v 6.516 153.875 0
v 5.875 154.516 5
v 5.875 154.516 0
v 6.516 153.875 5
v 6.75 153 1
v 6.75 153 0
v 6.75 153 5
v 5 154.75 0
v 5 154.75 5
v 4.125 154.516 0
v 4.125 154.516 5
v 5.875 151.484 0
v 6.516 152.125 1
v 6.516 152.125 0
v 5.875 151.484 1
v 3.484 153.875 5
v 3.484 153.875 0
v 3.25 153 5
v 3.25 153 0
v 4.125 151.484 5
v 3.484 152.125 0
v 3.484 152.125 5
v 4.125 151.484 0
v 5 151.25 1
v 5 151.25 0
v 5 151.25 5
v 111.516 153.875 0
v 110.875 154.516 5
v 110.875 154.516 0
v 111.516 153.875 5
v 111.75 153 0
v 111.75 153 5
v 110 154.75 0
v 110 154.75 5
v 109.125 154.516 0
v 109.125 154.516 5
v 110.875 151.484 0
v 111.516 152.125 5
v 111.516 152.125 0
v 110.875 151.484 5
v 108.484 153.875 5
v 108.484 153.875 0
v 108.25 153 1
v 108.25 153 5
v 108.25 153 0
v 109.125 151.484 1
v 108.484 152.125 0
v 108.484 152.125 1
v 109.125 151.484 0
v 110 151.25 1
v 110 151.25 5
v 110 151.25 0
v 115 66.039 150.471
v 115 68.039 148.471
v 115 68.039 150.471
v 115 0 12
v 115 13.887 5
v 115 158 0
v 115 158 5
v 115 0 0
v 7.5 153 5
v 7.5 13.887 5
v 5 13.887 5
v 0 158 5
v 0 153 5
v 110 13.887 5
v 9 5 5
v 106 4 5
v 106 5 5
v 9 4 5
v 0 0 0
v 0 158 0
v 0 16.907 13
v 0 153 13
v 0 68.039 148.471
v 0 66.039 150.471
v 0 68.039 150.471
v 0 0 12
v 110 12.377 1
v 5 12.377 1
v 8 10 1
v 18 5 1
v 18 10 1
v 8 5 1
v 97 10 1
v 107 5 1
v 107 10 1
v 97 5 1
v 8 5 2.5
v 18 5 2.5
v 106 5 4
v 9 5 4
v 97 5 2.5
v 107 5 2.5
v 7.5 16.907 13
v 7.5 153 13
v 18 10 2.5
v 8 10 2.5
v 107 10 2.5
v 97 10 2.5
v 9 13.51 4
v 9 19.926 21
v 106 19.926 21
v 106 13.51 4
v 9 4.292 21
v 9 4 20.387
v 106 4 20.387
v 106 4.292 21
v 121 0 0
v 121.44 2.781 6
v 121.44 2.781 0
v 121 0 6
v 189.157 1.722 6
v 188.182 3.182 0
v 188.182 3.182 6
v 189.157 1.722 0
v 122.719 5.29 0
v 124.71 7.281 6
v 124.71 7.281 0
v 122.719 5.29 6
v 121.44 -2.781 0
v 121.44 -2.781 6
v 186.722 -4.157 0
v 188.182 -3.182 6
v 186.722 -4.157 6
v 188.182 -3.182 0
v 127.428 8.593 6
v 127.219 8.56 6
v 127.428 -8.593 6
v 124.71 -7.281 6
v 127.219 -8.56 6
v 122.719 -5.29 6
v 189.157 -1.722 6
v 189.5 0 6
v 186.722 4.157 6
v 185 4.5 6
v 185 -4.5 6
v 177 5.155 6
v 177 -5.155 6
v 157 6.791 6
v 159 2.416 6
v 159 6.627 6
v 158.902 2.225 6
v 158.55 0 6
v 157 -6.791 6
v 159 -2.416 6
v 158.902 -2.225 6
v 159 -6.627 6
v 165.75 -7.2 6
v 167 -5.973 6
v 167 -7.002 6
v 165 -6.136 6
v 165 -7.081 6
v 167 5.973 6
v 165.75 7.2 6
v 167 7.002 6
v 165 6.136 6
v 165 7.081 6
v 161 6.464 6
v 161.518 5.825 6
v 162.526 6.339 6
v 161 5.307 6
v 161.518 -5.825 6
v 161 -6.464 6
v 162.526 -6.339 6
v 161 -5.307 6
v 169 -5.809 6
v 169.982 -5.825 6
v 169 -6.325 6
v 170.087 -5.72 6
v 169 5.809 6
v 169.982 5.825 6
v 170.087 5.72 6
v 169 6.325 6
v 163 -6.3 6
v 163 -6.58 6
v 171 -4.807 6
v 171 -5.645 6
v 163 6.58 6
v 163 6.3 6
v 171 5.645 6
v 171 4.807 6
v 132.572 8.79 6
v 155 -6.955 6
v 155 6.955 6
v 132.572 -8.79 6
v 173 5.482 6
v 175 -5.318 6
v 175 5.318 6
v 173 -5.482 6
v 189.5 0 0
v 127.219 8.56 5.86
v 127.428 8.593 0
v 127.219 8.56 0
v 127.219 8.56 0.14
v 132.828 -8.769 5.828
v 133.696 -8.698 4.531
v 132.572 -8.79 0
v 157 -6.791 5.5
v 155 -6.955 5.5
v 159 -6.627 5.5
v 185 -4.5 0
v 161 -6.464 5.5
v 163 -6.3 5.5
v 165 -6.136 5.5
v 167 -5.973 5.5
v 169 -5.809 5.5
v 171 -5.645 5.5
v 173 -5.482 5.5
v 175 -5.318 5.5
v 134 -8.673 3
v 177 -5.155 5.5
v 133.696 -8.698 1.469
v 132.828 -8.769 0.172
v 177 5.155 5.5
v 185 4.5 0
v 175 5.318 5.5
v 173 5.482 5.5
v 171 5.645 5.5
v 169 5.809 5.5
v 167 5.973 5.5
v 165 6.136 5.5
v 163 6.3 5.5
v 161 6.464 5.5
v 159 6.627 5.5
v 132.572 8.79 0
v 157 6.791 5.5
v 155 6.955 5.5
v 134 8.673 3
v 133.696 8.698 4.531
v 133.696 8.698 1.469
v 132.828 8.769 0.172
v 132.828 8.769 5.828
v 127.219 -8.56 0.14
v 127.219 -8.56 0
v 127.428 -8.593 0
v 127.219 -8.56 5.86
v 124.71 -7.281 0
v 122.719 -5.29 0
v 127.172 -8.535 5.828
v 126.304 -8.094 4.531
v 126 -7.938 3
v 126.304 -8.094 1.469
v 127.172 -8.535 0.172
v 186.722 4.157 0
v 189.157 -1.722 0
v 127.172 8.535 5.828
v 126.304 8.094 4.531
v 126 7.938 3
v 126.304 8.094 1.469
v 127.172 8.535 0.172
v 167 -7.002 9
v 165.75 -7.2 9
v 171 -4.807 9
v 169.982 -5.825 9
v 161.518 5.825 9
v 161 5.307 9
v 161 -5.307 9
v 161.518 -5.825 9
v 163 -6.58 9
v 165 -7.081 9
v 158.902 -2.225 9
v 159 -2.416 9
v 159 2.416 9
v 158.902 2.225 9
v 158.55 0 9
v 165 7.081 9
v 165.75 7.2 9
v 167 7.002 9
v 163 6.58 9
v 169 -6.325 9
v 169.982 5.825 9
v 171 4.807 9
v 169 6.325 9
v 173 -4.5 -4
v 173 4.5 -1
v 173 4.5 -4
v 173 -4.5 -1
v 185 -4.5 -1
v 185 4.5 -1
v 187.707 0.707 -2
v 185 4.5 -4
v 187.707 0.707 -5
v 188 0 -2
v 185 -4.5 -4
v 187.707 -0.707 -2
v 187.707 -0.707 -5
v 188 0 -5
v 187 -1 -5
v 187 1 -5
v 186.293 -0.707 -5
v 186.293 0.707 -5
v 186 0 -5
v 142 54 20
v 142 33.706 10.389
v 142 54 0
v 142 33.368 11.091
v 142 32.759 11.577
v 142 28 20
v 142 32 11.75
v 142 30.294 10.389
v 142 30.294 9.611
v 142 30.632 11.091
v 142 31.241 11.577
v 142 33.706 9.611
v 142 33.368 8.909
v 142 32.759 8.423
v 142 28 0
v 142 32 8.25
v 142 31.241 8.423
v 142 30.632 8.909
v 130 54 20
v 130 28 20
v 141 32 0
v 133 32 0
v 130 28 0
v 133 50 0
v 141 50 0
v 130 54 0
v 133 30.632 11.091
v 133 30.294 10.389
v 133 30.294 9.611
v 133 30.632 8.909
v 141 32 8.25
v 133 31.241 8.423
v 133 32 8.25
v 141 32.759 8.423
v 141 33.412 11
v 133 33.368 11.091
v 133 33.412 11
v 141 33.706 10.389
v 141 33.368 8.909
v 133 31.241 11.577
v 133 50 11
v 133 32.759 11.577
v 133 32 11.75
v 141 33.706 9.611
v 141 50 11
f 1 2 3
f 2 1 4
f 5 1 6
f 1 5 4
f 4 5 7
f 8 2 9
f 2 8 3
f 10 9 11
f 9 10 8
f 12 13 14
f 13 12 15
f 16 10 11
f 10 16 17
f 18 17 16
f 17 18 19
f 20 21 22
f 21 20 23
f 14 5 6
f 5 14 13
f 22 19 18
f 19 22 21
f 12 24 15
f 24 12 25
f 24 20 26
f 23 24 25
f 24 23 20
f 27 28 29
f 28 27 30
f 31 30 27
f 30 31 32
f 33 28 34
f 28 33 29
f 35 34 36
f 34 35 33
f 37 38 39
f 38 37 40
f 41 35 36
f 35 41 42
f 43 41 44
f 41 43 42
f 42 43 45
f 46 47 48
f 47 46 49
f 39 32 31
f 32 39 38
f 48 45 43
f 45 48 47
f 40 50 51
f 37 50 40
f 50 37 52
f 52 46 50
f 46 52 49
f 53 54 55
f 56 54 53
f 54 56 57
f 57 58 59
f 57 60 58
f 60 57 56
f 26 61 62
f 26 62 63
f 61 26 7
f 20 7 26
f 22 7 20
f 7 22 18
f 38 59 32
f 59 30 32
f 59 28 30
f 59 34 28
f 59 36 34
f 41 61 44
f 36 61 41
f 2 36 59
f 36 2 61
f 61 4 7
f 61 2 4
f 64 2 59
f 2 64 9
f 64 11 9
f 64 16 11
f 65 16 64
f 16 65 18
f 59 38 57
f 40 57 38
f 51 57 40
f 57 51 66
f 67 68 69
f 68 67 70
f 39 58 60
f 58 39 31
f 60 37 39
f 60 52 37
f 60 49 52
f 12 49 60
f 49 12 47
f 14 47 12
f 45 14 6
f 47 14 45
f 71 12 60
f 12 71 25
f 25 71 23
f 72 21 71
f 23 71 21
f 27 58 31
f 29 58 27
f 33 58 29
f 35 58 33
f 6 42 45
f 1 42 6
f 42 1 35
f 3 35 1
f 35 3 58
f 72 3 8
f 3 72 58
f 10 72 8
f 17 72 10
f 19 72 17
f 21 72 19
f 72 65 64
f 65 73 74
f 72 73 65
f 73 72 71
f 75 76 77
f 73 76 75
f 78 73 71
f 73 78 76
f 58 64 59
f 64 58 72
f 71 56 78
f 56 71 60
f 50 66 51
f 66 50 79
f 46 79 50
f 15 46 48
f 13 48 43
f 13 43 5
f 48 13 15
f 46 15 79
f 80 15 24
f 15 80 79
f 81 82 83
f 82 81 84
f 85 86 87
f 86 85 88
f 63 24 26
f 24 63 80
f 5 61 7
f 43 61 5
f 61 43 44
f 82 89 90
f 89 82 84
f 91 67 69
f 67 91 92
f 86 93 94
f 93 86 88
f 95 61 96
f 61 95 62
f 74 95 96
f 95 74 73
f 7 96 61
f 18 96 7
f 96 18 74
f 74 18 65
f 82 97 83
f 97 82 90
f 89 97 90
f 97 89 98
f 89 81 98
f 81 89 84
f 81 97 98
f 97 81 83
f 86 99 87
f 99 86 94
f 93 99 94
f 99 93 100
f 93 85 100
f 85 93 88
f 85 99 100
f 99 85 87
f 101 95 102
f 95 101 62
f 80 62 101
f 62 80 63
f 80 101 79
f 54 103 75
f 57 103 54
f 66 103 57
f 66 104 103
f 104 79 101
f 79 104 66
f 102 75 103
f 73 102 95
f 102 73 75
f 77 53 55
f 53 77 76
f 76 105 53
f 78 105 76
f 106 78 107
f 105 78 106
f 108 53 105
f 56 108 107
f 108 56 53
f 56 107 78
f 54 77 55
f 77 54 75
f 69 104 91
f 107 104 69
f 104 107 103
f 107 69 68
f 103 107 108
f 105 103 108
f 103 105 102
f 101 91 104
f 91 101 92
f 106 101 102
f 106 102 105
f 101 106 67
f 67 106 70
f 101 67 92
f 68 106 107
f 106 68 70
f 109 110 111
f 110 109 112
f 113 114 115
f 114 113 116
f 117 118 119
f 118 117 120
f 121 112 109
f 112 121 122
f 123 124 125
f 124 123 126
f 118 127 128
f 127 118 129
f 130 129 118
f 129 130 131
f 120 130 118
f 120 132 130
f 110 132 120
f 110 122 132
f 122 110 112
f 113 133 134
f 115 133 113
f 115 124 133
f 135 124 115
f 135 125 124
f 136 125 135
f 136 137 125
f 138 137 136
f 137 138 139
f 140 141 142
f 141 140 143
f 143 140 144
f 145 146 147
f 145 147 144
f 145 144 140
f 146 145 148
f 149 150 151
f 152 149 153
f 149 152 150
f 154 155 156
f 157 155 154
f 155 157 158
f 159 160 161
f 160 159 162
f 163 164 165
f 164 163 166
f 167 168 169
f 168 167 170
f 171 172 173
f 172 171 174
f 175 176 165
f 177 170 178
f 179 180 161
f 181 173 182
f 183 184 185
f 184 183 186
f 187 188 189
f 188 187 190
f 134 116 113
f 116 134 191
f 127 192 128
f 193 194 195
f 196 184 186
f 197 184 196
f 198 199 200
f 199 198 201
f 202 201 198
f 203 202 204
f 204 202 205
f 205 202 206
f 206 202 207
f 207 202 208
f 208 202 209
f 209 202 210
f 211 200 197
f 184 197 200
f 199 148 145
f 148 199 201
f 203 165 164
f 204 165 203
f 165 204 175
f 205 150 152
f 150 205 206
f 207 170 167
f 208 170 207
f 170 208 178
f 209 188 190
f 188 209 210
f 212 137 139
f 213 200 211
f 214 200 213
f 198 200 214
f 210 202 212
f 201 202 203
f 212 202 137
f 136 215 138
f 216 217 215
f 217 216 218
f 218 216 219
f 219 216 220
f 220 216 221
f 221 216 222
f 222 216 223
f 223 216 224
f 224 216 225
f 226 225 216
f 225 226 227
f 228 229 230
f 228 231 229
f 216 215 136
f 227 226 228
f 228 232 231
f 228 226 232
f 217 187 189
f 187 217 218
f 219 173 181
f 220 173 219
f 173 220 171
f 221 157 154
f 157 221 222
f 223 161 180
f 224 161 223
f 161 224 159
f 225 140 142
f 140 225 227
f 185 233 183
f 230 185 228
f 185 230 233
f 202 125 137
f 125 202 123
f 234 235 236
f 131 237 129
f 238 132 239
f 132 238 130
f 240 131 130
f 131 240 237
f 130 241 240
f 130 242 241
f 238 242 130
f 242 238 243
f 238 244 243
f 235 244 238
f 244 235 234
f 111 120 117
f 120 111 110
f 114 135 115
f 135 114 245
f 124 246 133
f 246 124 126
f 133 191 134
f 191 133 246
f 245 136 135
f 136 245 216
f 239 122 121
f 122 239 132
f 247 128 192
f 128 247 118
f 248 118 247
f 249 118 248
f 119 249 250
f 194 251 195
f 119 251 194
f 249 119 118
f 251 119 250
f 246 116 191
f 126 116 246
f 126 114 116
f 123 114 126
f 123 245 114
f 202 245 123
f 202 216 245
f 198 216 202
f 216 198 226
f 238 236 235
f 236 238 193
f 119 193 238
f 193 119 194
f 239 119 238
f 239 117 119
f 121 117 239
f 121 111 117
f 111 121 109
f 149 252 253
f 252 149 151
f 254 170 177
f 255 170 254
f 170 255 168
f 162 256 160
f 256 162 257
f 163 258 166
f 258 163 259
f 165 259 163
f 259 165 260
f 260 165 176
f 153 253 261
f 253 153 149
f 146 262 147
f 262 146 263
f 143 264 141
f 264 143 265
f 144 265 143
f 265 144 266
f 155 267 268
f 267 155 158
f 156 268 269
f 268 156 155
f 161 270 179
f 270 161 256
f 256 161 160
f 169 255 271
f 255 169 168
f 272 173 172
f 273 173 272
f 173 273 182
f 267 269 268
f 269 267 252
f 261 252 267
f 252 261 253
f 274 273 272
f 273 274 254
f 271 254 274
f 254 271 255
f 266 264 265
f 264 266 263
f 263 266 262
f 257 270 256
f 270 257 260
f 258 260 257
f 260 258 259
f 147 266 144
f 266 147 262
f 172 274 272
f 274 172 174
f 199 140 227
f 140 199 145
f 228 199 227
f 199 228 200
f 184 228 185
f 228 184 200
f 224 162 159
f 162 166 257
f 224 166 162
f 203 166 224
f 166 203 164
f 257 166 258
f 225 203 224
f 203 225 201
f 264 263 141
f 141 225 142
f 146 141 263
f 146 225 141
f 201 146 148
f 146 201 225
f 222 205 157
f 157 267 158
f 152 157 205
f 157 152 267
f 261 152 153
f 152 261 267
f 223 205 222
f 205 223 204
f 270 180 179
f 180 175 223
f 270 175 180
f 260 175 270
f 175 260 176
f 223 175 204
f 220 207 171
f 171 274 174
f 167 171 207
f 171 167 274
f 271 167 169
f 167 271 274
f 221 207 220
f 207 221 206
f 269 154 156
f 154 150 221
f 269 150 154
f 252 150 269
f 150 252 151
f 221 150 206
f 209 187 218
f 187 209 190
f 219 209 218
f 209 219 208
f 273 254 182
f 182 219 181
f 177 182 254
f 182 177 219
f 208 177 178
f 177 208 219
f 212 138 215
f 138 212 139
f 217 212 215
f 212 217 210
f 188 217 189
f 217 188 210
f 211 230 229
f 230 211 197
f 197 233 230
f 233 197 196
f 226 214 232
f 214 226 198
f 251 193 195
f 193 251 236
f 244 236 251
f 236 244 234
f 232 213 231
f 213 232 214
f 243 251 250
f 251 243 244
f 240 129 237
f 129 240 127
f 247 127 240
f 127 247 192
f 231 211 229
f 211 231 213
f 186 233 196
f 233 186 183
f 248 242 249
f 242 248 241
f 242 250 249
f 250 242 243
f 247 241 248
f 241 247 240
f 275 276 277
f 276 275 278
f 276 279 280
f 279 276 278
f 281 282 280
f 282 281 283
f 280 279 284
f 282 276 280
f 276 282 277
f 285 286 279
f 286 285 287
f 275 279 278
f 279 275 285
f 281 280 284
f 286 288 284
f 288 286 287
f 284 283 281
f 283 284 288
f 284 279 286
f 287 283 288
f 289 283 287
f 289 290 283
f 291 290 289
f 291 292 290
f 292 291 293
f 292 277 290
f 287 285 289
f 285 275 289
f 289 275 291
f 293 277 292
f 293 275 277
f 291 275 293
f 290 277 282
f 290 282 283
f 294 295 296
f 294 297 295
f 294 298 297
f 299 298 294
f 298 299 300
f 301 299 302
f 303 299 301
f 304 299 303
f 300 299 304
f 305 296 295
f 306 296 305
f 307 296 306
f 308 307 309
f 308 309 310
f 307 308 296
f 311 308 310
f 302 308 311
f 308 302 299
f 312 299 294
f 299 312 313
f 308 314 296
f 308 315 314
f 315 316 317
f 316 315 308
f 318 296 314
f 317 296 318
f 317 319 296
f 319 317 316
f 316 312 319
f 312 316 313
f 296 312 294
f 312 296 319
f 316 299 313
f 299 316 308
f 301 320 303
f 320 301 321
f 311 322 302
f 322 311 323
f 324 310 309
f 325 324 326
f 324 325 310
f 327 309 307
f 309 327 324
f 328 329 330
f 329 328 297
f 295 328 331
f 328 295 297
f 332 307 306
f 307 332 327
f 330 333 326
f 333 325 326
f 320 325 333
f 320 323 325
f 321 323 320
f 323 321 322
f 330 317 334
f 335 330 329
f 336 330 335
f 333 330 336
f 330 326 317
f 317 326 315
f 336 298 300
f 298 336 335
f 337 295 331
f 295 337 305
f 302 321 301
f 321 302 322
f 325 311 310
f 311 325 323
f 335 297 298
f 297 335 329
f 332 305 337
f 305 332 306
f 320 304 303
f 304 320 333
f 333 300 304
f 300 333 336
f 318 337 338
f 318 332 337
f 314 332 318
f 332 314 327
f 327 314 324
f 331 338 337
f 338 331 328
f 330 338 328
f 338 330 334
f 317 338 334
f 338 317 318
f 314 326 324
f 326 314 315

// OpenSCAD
// Flip Book Stand + Page Turner Mechanism
// Spring-loaded thumb lever flips pages at consistent speed
// DUAL COLOR: frame (dark wood PLA) + lever + spring seat (accent)
// PLA — 0.2mm, 4 walls, 20% infill
// Hardware: 1x M3x20 bolt pivot, 1x guitar string spring

BOOK_W   = 105;  // Standard flip book width
BOOK_H   = 148;  // A6 / standard flip book height
BOOK_T   = 20;   // Book thickness (stack of pages)
FRAME_T  = 5.0;  // Frame wall thickness
BASE_H   = 12;
TILT     = 20;   // Book tilt angle (degrees)
LEVER_L  = 55;   // Thumb lever length
LEVER_W  = 18;
LEVER_T  = 6.0;
PIVOT_D  = 3.5;  // M3 pivot
SPRING_D = 8;    // Spring seat diameter
PAGE_SEP = 1.0;  // Page separator rib gap

module frame_back() {
    // Back plate that holds the book
    difference() {
        cube([BOOK_W + FRAME_T*2, BOOK_H + FRAME_T*2, FRAME_T]);
        // Book window (recessed)
        translate([FRAME_T, FRAME_T, 1])
            cube([BOOK_W, BOOK_H, FRAME_T]);
        // Corner screw holes
        for (x = [5, BOOK_W + FRAME_T*2 - 5],
             y = [5, BOOK_H + FRAME_T*2 - 5])
            translate([x, y, -1])
                cylinder(d = 3.5, h = FRAME_T + 2, $fn = 12);
    }
    // Spine clamp (holds left edge of book)
    translate([0, FRAME_T, FRAME_T])
        cube([FRAME_T * 1.5, BOOK_H, 8]);
}

module base_stand() {
    // Tilted wedge base
    difference() {
        hull() {
            cube([BOOK_W + FRAME_T*2, BASE_H, BASE_H]);
            translate([0, BASE_H + (BOOK_H + FRAME_T*2) * sin(TILT),
                       (BOOK_H + FRAME_T*2) * cos(TILT)])
                cube([BOOK_W + FRAME_T*2, 2, 2]);
        }
        // Weight reduction
        translate([FRAME_T + 4, 4, 4])
            cube([BOOK_W - 8, BASE_H + 20, BASE_H + 5]);
        // Anti-slip pad recesses (feet)
        for (x = [8, BOOK_W + FRAME_T*2 - 18])
            translate([x, 2, -0.5])
                cube([10, 8, 3]);
    }
}

module thumb_lever() {
    // Spring-loaded page flipper
    difference() {
        union() {
            // Lever arm
            hull() {
                cylinder(d = LEVER_W, h = LEVER_T, $fn = 20);
                translate([LEVER_L, 0, 0])
                    cylinder(d = LEVER_W * 0.5, h = LEVER_T, $fn = 16);
            }
            // Thumb groove pad
            translate([LEVER_L * 0.65, 0, LEVER_T])
                cylinder(d = LEVER_W * 0.8, h = 3, $fn = 20);
        }
        // Pivot hole
        cylinder(d = PIVOT_D, h = LEVER_T + 1, $fn = 14);
        // Spring tension slot
        translate([0, 0, LEVER_T/2])
            rotate([90, 0, 0])
                cylinder(d = SPRING_D, h = LEVER_W + 1, center = true, $fn = 16);
        // Thumb grip knurling
        for (i = [0:5])
            translate([LEVER_L * 0.6 + i * 4 - 8, -LEVER_W/2, LEVER_T - 0.5])
                cube([2, LEVER_W, 4]);
    }
    // Page separator fins (peels one page at a time)
    translate([LEVER_L - 12, -LEVER_W/4, 0])
        for (i = [0:2])
            translate([0, 0, -i * PAGE_SEP - 2])
                hull() {
                    cube([12, LEVER_W/2, 1]);
                    translate([14, LEVER_W/4, -1])
                        cylinder(d = 2, h = 1, $fn = 8);
                }
}

module pivot_bracket() {
    // Mounts lever to frame side
    difference() {
        cube([12, LEVER_W + 8, 20]);
        translate([3, 4, 10])
            rotate([0, 90, 0])
                cylinder(d = PIVOT_D, h = 10, $fn = 14);
        // Lever slot
        translate([3, 4, -1])
            cube([8, LEVER_W, 12]);
    }
}

// Color 1 (wood PLA): frame + base
frame_back();
base_stand();
// Color 2 (accent): lever + bracket
translate([BOOK_W + FRAME_T*2 + 15, 0, 0]) {
    thumb_lever();
    translate([0, LEVER_W + 10, 0]) pivot_bracket();
}
